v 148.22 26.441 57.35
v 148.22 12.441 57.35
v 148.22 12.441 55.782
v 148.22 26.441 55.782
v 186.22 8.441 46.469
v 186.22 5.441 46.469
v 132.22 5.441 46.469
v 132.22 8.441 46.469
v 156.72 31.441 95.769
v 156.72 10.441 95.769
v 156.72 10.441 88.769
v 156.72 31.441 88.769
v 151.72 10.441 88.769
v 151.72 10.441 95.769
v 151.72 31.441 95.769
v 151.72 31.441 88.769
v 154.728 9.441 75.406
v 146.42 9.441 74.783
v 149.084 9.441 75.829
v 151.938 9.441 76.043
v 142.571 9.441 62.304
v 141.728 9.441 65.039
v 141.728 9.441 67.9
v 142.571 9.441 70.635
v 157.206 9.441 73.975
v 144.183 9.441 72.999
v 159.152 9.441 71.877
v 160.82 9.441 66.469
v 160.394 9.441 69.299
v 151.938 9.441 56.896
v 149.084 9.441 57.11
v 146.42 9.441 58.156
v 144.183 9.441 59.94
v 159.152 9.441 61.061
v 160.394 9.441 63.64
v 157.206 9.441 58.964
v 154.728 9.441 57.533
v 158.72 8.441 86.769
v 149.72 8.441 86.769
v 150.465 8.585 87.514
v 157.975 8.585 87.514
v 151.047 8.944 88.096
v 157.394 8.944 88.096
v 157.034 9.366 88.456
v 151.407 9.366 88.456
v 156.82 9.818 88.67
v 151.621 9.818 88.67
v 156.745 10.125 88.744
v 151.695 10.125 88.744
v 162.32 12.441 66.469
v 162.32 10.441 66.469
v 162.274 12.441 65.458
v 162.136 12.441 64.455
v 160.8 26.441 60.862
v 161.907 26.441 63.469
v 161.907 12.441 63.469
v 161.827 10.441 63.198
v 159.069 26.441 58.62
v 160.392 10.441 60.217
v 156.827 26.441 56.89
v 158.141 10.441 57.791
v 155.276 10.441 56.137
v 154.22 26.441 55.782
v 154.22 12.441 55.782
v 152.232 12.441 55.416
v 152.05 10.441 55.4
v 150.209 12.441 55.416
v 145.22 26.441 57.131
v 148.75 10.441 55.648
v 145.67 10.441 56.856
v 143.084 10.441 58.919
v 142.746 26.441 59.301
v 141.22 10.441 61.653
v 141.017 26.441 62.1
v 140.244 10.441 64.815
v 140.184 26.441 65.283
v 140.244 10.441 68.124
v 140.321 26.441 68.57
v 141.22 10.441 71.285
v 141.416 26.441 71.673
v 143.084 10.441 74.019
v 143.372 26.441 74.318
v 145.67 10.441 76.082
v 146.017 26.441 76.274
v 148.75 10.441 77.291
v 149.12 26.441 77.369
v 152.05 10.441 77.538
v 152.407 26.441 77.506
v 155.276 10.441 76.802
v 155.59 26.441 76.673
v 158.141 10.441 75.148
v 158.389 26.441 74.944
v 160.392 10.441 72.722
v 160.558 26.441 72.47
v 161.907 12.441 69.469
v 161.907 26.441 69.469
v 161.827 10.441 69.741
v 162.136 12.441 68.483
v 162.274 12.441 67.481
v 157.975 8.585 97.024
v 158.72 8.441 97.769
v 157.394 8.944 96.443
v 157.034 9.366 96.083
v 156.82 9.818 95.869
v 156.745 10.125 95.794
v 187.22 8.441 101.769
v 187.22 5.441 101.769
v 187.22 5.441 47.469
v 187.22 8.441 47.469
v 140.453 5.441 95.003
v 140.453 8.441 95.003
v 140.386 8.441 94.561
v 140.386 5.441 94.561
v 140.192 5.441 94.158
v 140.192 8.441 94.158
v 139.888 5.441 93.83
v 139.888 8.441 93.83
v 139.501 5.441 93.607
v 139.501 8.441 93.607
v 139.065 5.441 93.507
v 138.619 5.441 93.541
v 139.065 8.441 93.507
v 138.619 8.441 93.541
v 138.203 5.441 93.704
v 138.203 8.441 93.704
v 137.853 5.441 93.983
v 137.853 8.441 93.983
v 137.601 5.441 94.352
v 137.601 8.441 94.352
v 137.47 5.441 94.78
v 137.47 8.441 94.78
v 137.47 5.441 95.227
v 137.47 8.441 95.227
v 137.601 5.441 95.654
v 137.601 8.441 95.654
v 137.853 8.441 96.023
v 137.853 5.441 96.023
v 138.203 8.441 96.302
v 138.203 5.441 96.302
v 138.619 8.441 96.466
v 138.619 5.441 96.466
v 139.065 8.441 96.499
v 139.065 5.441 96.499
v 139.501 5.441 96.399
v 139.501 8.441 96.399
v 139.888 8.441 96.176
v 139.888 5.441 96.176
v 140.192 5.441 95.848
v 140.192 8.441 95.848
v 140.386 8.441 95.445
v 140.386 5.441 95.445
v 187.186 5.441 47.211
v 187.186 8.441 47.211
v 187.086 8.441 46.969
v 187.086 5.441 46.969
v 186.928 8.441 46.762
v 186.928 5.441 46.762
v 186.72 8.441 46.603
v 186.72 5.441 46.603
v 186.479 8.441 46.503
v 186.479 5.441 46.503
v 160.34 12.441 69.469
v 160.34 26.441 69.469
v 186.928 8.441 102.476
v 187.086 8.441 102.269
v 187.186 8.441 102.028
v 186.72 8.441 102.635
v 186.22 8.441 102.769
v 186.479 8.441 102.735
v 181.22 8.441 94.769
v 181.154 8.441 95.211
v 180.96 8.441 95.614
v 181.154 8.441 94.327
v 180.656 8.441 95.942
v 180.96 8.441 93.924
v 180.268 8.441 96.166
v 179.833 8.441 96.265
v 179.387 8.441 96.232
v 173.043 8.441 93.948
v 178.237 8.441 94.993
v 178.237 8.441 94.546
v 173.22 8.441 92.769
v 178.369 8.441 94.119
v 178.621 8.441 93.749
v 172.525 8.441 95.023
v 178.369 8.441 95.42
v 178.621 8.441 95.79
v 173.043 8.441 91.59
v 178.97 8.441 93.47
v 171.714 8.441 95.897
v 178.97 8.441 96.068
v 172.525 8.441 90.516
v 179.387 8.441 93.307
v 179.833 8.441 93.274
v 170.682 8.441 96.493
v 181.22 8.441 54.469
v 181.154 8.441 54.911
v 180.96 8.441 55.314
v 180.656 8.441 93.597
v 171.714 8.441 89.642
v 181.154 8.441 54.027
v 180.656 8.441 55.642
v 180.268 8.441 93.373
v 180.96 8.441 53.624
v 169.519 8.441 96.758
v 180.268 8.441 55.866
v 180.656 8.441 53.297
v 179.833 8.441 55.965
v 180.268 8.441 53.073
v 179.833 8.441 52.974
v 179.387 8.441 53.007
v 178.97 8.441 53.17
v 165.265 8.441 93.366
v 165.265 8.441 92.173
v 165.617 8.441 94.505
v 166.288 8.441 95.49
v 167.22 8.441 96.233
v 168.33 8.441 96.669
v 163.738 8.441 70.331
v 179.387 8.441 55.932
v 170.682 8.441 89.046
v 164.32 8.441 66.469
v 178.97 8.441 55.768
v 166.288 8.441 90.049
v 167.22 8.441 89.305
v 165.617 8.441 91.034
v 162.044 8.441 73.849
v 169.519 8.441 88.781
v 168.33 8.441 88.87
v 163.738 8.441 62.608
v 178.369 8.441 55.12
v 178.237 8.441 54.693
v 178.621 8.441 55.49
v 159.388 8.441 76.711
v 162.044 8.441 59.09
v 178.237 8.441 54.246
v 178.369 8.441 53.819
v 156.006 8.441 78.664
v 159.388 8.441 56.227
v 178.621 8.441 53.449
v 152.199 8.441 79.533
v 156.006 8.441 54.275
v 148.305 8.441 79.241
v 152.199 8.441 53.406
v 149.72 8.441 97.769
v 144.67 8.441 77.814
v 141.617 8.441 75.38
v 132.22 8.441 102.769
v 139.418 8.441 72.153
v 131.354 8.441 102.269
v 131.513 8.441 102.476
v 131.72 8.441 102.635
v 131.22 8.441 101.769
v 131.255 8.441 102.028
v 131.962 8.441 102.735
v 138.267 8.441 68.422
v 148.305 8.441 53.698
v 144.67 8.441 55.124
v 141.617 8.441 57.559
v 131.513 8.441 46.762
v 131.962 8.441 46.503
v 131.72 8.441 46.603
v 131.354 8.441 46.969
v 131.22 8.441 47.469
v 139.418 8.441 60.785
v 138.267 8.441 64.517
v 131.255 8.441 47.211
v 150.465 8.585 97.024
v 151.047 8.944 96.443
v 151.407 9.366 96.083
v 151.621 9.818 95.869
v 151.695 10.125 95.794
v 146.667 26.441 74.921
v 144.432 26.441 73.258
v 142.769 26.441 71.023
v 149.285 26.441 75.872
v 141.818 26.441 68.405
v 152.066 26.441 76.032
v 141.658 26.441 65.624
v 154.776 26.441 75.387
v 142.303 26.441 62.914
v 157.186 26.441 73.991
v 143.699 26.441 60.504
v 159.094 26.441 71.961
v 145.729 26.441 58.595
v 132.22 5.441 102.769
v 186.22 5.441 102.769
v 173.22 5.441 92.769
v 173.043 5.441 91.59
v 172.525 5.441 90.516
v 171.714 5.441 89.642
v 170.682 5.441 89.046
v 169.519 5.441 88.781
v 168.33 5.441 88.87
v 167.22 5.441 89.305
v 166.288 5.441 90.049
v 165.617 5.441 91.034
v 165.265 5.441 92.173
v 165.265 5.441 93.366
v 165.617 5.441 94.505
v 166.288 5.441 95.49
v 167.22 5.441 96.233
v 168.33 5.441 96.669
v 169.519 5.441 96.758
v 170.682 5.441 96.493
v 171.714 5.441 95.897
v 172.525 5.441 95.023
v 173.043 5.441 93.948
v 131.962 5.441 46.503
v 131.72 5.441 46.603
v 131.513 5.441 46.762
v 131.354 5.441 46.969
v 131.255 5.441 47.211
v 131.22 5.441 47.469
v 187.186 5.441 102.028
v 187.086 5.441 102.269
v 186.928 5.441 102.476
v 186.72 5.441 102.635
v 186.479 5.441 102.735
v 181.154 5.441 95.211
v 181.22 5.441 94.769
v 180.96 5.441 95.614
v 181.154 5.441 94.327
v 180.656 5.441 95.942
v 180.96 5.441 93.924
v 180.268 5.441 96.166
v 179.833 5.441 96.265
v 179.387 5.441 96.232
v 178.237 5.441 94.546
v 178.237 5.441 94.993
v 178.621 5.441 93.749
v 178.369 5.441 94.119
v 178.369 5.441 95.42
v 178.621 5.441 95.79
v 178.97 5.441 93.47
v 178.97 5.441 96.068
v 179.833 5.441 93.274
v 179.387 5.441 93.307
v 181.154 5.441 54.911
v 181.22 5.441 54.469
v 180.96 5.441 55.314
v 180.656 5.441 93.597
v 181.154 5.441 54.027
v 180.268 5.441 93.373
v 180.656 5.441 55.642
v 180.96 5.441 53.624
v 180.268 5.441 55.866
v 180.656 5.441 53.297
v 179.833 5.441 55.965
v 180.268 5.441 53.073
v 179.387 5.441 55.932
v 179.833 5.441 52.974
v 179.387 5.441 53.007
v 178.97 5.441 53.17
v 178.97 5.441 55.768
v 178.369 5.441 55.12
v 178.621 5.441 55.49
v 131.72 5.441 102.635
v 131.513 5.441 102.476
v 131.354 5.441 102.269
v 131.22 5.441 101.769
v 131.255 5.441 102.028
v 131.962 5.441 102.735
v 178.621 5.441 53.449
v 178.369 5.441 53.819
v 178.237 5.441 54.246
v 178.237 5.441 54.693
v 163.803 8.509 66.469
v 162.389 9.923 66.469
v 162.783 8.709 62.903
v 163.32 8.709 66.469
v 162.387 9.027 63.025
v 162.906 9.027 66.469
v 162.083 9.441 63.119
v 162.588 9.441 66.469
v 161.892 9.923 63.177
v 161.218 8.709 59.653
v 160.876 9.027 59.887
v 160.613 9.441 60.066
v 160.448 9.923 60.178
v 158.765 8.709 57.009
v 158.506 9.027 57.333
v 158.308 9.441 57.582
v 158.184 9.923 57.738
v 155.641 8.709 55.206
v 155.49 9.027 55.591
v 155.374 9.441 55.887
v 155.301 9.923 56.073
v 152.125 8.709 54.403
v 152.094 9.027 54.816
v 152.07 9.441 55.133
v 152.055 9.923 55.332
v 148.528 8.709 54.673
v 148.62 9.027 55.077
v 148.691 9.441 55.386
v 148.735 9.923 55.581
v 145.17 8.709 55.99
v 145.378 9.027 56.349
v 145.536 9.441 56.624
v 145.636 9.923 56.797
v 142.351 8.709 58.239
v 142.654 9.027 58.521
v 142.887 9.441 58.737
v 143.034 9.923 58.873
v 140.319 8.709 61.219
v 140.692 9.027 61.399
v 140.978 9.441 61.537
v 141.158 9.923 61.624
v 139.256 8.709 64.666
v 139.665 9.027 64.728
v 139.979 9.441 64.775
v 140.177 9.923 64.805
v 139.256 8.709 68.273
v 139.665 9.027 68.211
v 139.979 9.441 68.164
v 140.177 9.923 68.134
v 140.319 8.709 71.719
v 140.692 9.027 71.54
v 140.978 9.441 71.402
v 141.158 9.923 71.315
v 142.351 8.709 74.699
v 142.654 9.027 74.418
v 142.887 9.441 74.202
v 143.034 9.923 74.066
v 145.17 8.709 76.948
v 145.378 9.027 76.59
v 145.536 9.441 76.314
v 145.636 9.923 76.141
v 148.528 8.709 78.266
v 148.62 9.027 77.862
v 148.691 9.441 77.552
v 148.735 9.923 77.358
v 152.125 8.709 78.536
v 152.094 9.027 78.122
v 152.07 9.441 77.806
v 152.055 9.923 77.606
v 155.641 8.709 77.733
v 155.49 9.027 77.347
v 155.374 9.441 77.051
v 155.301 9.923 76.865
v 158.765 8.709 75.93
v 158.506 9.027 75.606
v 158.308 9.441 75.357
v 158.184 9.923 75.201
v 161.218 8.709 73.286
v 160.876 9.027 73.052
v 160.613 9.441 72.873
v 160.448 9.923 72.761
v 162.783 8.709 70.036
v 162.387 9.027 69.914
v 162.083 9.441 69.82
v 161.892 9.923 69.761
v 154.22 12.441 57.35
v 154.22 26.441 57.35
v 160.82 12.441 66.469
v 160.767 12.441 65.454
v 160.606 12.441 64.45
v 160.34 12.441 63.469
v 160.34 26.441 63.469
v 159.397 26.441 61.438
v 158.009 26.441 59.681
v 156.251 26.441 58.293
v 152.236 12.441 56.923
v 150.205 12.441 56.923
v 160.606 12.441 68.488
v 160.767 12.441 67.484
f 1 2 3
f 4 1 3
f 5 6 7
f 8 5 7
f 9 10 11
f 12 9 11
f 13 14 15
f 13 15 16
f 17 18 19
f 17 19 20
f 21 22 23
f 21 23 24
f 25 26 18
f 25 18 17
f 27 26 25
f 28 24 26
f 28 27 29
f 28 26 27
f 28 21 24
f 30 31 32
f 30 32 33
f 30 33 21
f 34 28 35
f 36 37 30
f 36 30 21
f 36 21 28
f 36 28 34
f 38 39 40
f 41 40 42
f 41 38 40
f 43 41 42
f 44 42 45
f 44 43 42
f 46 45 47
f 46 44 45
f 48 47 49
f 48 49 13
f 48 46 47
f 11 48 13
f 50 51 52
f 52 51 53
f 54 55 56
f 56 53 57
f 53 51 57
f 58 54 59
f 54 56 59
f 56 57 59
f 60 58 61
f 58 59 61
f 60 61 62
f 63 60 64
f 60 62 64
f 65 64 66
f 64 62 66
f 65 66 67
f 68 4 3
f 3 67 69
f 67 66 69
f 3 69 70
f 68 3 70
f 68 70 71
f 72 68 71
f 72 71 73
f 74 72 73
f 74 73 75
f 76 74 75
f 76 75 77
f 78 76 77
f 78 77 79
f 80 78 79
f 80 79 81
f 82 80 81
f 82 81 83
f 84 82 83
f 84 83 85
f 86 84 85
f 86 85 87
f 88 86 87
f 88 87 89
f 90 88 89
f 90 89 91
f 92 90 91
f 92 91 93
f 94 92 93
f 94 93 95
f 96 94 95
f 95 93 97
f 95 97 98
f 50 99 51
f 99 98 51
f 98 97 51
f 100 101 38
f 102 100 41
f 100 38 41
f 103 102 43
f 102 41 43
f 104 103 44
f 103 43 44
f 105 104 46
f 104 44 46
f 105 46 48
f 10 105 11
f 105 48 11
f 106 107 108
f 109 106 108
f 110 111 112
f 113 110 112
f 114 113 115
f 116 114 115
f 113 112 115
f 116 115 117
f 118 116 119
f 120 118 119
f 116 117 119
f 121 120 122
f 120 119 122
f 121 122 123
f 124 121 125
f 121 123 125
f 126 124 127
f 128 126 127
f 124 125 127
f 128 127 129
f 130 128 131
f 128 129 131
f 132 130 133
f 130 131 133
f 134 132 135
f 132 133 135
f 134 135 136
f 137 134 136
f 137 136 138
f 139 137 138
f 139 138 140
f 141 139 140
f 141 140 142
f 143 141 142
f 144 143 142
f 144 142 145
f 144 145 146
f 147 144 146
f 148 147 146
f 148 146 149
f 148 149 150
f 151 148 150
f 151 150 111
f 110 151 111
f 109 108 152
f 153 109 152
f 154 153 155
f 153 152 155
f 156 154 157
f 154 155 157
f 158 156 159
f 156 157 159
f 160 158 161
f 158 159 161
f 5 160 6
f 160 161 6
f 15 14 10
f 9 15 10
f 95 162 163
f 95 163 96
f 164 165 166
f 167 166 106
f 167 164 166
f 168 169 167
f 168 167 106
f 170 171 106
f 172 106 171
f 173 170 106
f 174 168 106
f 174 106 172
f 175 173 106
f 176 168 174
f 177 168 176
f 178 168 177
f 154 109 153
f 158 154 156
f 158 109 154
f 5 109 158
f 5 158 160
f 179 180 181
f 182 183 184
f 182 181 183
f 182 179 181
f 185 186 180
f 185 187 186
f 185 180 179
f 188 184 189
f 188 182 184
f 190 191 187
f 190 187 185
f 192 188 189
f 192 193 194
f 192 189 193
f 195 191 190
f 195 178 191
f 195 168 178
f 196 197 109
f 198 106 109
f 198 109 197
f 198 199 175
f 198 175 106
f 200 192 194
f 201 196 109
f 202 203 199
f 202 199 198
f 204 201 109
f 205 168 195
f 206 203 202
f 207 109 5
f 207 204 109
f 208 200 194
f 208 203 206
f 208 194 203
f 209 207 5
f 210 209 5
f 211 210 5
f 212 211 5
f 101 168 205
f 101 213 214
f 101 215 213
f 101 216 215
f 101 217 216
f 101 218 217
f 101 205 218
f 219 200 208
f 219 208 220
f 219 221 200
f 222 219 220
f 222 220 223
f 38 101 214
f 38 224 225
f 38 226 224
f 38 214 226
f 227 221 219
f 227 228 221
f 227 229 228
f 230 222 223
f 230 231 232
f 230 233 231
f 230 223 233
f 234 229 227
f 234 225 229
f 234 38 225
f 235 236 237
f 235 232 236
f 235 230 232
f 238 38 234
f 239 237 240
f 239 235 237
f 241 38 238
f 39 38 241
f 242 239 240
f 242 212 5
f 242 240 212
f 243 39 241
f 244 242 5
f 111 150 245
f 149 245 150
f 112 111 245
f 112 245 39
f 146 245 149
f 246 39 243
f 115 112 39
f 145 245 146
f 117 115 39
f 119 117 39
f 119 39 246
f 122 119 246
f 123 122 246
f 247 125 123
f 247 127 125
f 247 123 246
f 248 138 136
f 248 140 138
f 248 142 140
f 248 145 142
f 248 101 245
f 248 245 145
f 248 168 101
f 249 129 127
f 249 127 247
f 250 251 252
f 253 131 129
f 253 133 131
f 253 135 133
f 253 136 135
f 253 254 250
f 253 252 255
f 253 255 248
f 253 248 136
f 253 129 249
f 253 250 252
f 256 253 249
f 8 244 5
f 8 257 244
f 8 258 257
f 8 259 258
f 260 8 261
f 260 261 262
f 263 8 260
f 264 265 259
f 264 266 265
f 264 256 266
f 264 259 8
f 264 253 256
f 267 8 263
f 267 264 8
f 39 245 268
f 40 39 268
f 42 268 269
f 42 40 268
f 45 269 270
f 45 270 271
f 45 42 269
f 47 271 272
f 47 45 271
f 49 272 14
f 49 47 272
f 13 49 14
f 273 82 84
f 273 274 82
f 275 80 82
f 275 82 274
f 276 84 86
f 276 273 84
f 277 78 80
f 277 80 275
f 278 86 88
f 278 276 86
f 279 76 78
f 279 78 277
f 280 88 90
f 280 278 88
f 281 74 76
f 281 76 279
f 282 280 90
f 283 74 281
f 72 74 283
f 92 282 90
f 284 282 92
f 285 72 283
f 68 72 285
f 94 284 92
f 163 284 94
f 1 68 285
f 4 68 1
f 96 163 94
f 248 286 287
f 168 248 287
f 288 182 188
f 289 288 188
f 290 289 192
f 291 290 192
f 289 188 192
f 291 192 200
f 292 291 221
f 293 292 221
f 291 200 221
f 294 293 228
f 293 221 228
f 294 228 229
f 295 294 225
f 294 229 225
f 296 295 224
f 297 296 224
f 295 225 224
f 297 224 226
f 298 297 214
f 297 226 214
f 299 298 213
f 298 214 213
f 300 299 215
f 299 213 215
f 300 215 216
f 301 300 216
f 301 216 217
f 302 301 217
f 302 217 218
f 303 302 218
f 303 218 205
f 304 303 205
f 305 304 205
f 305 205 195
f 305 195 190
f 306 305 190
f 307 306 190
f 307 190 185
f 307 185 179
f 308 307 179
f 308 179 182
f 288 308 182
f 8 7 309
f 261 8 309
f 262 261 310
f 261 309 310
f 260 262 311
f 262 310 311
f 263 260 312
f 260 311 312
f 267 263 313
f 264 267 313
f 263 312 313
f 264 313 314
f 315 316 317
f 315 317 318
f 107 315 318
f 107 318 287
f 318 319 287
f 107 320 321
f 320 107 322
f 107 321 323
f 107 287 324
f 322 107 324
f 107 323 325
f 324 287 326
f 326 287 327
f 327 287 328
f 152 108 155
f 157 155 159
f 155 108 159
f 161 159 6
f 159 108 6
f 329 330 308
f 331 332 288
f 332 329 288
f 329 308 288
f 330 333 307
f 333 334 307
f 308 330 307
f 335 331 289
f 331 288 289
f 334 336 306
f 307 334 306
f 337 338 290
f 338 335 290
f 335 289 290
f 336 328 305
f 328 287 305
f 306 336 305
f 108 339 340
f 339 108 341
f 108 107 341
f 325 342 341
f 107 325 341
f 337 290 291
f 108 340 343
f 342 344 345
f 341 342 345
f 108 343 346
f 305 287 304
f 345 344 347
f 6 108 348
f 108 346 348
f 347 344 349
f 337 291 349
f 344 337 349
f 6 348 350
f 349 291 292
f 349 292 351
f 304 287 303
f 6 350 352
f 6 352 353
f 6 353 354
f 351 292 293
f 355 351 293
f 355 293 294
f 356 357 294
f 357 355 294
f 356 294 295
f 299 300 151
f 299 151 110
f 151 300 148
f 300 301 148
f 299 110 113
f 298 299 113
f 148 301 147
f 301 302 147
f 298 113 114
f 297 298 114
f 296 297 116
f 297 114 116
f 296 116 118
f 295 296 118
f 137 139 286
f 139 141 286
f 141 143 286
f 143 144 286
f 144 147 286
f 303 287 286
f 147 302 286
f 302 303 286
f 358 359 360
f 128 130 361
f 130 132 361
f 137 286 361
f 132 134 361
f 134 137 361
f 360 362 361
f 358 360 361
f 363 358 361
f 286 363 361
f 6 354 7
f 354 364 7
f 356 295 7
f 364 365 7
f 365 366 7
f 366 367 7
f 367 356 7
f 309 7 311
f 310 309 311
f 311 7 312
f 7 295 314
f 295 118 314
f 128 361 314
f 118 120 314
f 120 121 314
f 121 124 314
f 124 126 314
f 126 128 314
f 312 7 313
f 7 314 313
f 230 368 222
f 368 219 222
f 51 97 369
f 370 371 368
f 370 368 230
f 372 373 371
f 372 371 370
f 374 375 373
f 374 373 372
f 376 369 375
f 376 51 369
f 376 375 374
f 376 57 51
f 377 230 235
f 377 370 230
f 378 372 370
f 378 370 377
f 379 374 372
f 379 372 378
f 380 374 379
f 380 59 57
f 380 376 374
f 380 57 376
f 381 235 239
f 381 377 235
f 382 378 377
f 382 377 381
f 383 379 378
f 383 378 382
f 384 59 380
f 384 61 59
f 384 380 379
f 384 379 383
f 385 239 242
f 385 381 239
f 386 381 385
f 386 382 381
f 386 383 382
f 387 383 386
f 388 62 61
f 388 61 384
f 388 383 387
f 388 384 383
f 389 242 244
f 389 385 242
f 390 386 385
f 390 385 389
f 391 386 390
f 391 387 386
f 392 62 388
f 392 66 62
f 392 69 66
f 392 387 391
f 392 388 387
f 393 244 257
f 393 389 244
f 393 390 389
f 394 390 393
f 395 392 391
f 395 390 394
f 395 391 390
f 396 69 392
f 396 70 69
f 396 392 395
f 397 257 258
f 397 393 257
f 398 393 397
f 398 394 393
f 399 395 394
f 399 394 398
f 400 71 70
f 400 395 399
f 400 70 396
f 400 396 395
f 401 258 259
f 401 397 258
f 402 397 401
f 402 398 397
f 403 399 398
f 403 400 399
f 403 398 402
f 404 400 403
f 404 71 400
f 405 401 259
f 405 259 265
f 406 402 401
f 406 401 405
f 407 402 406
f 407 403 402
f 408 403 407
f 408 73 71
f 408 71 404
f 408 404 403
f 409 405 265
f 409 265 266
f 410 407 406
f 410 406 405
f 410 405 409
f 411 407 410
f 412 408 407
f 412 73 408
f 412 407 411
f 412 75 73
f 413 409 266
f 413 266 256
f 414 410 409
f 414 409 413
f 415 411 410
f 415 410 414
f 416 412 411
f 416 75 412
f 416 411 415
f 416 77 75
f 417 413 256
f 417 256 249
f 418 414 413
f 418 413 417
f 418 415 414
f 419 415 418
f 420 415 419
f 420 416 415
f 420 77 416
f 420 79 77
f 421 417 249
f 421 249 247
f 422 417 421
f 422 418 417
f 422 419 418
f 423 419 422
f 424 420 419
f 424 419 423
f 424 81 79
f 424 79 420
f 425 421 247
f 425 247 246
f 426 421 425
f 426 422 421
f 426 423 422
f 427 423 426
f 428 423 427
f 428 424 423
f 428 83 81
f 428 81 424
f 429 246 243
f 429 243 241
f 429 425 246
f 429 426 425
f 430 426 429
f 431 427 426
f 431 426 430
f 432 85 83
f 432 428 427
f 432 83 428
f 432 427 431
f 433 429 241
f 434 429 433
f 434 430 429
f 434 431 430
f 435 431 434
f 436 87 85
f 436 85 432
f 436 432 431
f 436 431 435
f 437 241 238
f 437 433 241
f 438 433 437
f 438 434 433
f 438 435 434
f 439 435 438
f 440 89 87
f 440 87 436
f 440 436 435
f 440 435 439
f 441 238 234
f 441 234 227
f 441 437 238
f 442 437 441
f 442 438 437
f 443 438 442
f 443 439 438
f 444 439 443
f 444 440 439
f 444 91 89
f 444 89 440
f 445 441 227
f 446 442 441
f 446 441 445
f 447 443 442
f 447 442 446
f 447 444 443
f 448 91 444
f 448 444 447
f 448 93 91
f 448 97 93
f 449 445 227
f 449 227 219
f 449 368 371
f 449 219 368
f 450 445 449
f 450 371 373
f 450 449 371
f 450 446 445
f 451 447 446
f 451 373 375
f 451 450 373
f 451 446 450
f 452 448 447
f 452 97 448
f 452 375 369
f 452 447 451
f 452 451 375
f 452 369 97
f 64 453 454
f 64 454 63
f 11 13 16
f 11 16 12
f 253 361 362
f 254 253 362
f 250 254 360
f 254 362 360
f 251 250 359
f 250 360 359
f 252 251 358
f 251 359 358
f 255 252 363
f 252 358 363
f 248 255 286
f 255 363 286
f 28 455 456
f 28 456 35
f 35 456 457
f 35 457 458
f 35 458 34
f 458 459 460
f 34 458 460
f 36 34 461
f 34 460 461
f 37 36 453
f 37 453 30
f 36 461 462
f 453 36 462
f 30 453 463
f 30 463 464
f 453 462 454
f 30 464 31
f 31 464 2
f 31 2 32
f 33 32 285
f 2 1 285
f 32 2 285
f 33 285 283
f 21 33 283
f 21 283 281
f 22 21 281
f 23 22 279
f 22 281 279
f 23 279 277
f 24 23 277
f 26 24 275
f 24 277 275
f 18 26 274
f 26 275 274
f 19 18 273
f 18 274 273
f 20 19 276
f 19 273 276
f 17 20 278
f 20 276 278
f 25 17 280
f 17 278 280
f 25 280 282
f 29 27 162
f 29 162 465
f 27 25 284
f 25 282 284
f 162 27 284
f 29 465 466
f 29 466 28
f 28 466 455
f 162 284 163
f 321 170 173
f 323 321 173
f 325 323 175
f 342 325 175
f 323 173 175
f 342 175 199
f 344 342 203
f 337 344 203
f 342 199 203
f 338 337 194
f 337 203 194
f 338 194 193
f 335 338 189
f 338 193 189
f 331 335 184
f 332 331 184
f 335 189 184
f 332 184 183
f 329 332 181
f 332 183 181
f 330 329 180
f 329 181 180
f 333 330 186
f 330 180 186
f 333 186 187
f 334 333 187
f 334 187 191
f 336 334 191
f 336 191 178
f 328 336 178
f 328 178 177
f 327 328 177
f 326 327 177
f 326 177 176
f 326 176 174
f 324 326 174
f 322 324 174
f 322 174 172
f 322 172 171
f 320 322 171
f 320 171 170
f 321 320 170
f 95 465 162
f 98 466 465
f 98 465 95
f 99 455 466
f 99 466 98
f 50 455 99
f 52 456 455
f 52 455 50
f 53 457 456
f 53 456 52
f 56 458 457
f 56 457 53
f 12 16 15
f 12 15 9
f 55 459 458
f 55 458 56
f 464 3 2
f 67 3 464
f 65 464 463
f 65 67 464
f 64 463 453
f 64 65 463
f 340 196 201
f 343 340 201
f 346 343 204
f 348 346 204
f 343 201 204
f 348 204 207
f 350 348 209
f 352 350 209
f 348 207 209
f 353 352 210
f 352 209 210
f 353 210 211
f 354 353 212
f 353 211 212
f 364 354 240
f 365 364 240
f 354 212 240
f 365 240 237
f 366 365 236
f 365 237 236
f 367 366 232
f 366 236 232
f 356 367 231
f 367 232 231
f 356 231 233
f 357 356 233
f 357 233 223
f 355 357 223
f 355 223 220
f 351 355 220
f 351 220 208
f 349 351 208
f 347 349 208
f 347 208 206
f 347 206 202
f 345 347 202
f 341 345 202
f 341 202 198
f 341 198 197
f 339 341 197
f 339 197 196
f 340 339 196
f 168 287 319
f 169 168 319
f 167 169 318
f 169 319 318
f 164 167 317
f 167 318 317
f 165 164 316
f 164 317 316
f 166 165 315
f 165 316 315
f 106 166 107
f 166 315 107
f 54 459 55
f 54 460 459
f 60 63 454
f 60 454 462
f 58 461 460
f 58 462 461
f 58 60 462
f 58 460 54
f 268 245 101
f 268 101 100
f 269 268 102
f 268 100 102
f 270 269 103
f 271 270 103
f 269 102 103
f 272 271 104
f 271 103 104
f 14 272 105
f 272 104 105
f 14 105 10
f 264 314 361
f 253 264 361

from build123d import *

# Parameters (mm, degrees)
BOSS_EXTRUDE1_DEPTH = 3
SKETCH2_R           = 11.1
BOSS_EXTRUDE2_DEPTH = 18
SKETCH3_R           = 9.6
CUT_EXTRUDE1_DEPTH  = 17
FILLET1_R           = 2
SKETCH4_W           = 10
SKETCH4_H           = 6
SKETCH4_W_2         = 6
SKETCH4_H_2         = 18
CUT_EXTRUDE2_DEPTH  = 14
SKETCH5_R           = 4
CUT_EXTRUDE3_DEPTH  = 4
CUT_EXTRUDE4_REACH  = 5
SKETCH6_R           = 1.5
SKETCH7_W           = 5
SKETCH7_H           = 7
BOSS_EXTRUDE3_DEPTH = 23
FILLET2_R           = 2


with BuildPart() as part:
    # Sketch1 → Boss-Extrude1 (new body)
    with BuildSketch(Plane(origin=(0, 5.44100589, 0), x_dir=(-0.502299233, 0, -0.864693865), z_dir=(0, 1, 0))):
        with BuildLine():
            Line((-182.040025286, -110.769690041), (-135.087148398, -138.044538379))
            ThreePointArc((-135.087148398, -138.044538379), (-134.328597463, -138.146454603), (-133.720155299, -137.682143746))
            Line((-133.720155299, -137.682143746), (-106.595996731, -90.988675017))
            ThreePointArc((-106.595996731, -90.988675017), (-106.494080507, -90.230124082), (-106.958391364, -89.621681919))
            Line((-106.958391364, -89.621681919), (-153.911268252, -62.346833581))
            ThreePointArc((-153.911268252, -62.346833581), (-154.669819187, -62.244917357), (-155.27826135, -62.709228213))
            Line((-155.27826135, -62.709228213), (-182.402419919, -109.402696943))
            ThreePointArc((-182.402419919, -109.402696943), (-182.504336143, -110.161247877), (-182.040025286, -110.769690041))
        make_face()
    extrude(amount=BOSS_EXTRUDE1_DEPTH)

    # Sketch2 → Boss-Extrude2 (add)
    with BuildSketch(Plane(origin=(0, 8.44100589, 0), x_dir=(1, 0, 0), z_dir=(0, 1, 0))):
        with Locations((151.220436476, -66.469362794)):
            Circle(SKETCH2_R)
    extrude(amount=BOSS_EXTRUDE2_DEPTH)

    # Sketch3 → Cut-Extrude1 (cut)
    with BuildSketch(Plane(origin=(0, 26.44100589, 0), x_dir=(1, 0, 0), z_dir=(0, 1, 0))):
        with Locations((151.220436476, -66.469362794)):
            Circle(SKETCH3_R)
    extrude(amount=-CUT_EXTRUDE1_DEPTH, mode=Mode.SUBTRACT)

    # Fillet1
    fillet1_edges = [part.edges().sort_by_distance(p)[0] for p in [
        (140.120436476, 8.44100589, 66.469362794),
    ]]
    fillet(fillet1_edges, radius=FILLET1_R)

    # Sketch4 → Cut-Extrude2 (cut)
    with BuildSketch(Plane(origin=(0, 26.44100589, 0), x_dir=(1, 0, 0), z_dir=(0, 1, 0))):
        with Locations((161.220436476, -66.469362794)):
            Rectangle(SKETCH4_W, SKETCH4_H)
        with Locations((151.220436476, -61.469362794)):
            Rectangle(SKETCH4_W_2, SKETCH4_H_2)
    extrude(amount=-CUT_EXTRUDE2_DEPTH, mode=Mode.SUBTRACT)

    # Sketch5 → Cut-Extrude3 (cut)
    with BuildSketch(Plane(origin=(0, 8.44100589, 0), x_dir=(1, 0, 0), z_dir=(0, 1, 0))):
        with Locations((169.220436476, -92.769362794)):
            Circle(SKETCH5_R)
    extrude(amount=-CUT_EXTRUDE3_DEPTH, mode=Mode.SUBTRACT)

    # Sketch6 → Cut-Extrude4 (cut, up to next)
    with BuildSketch(Plane(origin=(0, 8.44100589, 0), x_dir=(1, 0, 0), z_dir=(0, 1, 0)), mode=Mode.PRIVATE) as cut_extrude4_sk1:
        with Locations((179.720436476, -54.469362794)):
            Circle(SKETCH6_R)
    cut_extrude4_tool1 = extrude(cut_extrude4_sk1.sketch, amount=-CUT_EXTRUDE4_REACH, mode=Mode.PRIVATE) & part.part
    add(cut_extrude4_tool1.solids().sort_by_distance((179.720436, 8.441006, 54.469363))[0], mode=Mode.SUBTRACT)
    # Sketch6 → Cut-Extrude4 (cut, up to next)
    with BuildSketch(Plane(origin=(0, 8.44100589, 0), x_dir=(1, 0, 0), z_dir=(0, 1, 0)), mode=Mode.PRIVATE) as cut_extrude4_sk2:
        with Locations((179.720436476, -94.769362794)):
            Circle(SKETCH6_R)
    cut_extrude4_tool2 = extrude(cut_extrude4_sk2.sketch, amount=-CUT_EXTRUDE4_REACH, mode=Mode.PRIVATE) & part.part
    add(cut_extrude4_tool2.solids().sort_by_distance((179.720436, 8.441006, 94.769363))[0], mode=Mode.SUBTRACT)
    # Sketch6 → Cut-Extrude4 (cut, up to next)
    with BuildSketch(Plane(origin=(0, 8.44100589, 0), x_dir=(1, 0, 0), z_dir=(0, 1, 0)), mode=Mode.PRIVATE) as cut_extrude4_sk3:
        with Locations((138.952841808, -95.003108927)):
            Circle(SKETCH6_R)
    cut_extrude4_tool3 = extrude(cut_extrude4_sk3.sketch, amount=-CUT_EXTRUDE4_REACH, mode=Mode.PRIVATE) & part.part
    add(cut_extrude4_tool3.solids().sort_by_distance((138.952842, 8.441006, 95.003109))[0], mode=Mode.SUBTRACT)

    # Sketch7 → Boss-Extrude3 (add)
    with BuildSketch(Plane(origin=(0, 8.44100589, 0), x_dir=(1, 0, 0), z_dir=(0, 1, 0))):
        with Locations((154.220436476, -92.269362794)):
            Rectangle(SKETCH7_W, SKETCH7_H)
    extrude(amount=BOSS_EXTRUDE3_DEPTH)

    # Fillet2
    fillet2_edges = [part.edges().sort_by_distance(p)[0] for p in [
        (156.720436476, 8.44100589, 92.269362794),
        (154.220436476, 8.44100589, 88.769362794),
        (151.720436476, 8.44100589, 92.269362794),
        (154.220436476, 8.44100589, 95.769362794),
    ]]
    fillet(fillet2_edges, radius=FILLET2_R)


solid = part.part
